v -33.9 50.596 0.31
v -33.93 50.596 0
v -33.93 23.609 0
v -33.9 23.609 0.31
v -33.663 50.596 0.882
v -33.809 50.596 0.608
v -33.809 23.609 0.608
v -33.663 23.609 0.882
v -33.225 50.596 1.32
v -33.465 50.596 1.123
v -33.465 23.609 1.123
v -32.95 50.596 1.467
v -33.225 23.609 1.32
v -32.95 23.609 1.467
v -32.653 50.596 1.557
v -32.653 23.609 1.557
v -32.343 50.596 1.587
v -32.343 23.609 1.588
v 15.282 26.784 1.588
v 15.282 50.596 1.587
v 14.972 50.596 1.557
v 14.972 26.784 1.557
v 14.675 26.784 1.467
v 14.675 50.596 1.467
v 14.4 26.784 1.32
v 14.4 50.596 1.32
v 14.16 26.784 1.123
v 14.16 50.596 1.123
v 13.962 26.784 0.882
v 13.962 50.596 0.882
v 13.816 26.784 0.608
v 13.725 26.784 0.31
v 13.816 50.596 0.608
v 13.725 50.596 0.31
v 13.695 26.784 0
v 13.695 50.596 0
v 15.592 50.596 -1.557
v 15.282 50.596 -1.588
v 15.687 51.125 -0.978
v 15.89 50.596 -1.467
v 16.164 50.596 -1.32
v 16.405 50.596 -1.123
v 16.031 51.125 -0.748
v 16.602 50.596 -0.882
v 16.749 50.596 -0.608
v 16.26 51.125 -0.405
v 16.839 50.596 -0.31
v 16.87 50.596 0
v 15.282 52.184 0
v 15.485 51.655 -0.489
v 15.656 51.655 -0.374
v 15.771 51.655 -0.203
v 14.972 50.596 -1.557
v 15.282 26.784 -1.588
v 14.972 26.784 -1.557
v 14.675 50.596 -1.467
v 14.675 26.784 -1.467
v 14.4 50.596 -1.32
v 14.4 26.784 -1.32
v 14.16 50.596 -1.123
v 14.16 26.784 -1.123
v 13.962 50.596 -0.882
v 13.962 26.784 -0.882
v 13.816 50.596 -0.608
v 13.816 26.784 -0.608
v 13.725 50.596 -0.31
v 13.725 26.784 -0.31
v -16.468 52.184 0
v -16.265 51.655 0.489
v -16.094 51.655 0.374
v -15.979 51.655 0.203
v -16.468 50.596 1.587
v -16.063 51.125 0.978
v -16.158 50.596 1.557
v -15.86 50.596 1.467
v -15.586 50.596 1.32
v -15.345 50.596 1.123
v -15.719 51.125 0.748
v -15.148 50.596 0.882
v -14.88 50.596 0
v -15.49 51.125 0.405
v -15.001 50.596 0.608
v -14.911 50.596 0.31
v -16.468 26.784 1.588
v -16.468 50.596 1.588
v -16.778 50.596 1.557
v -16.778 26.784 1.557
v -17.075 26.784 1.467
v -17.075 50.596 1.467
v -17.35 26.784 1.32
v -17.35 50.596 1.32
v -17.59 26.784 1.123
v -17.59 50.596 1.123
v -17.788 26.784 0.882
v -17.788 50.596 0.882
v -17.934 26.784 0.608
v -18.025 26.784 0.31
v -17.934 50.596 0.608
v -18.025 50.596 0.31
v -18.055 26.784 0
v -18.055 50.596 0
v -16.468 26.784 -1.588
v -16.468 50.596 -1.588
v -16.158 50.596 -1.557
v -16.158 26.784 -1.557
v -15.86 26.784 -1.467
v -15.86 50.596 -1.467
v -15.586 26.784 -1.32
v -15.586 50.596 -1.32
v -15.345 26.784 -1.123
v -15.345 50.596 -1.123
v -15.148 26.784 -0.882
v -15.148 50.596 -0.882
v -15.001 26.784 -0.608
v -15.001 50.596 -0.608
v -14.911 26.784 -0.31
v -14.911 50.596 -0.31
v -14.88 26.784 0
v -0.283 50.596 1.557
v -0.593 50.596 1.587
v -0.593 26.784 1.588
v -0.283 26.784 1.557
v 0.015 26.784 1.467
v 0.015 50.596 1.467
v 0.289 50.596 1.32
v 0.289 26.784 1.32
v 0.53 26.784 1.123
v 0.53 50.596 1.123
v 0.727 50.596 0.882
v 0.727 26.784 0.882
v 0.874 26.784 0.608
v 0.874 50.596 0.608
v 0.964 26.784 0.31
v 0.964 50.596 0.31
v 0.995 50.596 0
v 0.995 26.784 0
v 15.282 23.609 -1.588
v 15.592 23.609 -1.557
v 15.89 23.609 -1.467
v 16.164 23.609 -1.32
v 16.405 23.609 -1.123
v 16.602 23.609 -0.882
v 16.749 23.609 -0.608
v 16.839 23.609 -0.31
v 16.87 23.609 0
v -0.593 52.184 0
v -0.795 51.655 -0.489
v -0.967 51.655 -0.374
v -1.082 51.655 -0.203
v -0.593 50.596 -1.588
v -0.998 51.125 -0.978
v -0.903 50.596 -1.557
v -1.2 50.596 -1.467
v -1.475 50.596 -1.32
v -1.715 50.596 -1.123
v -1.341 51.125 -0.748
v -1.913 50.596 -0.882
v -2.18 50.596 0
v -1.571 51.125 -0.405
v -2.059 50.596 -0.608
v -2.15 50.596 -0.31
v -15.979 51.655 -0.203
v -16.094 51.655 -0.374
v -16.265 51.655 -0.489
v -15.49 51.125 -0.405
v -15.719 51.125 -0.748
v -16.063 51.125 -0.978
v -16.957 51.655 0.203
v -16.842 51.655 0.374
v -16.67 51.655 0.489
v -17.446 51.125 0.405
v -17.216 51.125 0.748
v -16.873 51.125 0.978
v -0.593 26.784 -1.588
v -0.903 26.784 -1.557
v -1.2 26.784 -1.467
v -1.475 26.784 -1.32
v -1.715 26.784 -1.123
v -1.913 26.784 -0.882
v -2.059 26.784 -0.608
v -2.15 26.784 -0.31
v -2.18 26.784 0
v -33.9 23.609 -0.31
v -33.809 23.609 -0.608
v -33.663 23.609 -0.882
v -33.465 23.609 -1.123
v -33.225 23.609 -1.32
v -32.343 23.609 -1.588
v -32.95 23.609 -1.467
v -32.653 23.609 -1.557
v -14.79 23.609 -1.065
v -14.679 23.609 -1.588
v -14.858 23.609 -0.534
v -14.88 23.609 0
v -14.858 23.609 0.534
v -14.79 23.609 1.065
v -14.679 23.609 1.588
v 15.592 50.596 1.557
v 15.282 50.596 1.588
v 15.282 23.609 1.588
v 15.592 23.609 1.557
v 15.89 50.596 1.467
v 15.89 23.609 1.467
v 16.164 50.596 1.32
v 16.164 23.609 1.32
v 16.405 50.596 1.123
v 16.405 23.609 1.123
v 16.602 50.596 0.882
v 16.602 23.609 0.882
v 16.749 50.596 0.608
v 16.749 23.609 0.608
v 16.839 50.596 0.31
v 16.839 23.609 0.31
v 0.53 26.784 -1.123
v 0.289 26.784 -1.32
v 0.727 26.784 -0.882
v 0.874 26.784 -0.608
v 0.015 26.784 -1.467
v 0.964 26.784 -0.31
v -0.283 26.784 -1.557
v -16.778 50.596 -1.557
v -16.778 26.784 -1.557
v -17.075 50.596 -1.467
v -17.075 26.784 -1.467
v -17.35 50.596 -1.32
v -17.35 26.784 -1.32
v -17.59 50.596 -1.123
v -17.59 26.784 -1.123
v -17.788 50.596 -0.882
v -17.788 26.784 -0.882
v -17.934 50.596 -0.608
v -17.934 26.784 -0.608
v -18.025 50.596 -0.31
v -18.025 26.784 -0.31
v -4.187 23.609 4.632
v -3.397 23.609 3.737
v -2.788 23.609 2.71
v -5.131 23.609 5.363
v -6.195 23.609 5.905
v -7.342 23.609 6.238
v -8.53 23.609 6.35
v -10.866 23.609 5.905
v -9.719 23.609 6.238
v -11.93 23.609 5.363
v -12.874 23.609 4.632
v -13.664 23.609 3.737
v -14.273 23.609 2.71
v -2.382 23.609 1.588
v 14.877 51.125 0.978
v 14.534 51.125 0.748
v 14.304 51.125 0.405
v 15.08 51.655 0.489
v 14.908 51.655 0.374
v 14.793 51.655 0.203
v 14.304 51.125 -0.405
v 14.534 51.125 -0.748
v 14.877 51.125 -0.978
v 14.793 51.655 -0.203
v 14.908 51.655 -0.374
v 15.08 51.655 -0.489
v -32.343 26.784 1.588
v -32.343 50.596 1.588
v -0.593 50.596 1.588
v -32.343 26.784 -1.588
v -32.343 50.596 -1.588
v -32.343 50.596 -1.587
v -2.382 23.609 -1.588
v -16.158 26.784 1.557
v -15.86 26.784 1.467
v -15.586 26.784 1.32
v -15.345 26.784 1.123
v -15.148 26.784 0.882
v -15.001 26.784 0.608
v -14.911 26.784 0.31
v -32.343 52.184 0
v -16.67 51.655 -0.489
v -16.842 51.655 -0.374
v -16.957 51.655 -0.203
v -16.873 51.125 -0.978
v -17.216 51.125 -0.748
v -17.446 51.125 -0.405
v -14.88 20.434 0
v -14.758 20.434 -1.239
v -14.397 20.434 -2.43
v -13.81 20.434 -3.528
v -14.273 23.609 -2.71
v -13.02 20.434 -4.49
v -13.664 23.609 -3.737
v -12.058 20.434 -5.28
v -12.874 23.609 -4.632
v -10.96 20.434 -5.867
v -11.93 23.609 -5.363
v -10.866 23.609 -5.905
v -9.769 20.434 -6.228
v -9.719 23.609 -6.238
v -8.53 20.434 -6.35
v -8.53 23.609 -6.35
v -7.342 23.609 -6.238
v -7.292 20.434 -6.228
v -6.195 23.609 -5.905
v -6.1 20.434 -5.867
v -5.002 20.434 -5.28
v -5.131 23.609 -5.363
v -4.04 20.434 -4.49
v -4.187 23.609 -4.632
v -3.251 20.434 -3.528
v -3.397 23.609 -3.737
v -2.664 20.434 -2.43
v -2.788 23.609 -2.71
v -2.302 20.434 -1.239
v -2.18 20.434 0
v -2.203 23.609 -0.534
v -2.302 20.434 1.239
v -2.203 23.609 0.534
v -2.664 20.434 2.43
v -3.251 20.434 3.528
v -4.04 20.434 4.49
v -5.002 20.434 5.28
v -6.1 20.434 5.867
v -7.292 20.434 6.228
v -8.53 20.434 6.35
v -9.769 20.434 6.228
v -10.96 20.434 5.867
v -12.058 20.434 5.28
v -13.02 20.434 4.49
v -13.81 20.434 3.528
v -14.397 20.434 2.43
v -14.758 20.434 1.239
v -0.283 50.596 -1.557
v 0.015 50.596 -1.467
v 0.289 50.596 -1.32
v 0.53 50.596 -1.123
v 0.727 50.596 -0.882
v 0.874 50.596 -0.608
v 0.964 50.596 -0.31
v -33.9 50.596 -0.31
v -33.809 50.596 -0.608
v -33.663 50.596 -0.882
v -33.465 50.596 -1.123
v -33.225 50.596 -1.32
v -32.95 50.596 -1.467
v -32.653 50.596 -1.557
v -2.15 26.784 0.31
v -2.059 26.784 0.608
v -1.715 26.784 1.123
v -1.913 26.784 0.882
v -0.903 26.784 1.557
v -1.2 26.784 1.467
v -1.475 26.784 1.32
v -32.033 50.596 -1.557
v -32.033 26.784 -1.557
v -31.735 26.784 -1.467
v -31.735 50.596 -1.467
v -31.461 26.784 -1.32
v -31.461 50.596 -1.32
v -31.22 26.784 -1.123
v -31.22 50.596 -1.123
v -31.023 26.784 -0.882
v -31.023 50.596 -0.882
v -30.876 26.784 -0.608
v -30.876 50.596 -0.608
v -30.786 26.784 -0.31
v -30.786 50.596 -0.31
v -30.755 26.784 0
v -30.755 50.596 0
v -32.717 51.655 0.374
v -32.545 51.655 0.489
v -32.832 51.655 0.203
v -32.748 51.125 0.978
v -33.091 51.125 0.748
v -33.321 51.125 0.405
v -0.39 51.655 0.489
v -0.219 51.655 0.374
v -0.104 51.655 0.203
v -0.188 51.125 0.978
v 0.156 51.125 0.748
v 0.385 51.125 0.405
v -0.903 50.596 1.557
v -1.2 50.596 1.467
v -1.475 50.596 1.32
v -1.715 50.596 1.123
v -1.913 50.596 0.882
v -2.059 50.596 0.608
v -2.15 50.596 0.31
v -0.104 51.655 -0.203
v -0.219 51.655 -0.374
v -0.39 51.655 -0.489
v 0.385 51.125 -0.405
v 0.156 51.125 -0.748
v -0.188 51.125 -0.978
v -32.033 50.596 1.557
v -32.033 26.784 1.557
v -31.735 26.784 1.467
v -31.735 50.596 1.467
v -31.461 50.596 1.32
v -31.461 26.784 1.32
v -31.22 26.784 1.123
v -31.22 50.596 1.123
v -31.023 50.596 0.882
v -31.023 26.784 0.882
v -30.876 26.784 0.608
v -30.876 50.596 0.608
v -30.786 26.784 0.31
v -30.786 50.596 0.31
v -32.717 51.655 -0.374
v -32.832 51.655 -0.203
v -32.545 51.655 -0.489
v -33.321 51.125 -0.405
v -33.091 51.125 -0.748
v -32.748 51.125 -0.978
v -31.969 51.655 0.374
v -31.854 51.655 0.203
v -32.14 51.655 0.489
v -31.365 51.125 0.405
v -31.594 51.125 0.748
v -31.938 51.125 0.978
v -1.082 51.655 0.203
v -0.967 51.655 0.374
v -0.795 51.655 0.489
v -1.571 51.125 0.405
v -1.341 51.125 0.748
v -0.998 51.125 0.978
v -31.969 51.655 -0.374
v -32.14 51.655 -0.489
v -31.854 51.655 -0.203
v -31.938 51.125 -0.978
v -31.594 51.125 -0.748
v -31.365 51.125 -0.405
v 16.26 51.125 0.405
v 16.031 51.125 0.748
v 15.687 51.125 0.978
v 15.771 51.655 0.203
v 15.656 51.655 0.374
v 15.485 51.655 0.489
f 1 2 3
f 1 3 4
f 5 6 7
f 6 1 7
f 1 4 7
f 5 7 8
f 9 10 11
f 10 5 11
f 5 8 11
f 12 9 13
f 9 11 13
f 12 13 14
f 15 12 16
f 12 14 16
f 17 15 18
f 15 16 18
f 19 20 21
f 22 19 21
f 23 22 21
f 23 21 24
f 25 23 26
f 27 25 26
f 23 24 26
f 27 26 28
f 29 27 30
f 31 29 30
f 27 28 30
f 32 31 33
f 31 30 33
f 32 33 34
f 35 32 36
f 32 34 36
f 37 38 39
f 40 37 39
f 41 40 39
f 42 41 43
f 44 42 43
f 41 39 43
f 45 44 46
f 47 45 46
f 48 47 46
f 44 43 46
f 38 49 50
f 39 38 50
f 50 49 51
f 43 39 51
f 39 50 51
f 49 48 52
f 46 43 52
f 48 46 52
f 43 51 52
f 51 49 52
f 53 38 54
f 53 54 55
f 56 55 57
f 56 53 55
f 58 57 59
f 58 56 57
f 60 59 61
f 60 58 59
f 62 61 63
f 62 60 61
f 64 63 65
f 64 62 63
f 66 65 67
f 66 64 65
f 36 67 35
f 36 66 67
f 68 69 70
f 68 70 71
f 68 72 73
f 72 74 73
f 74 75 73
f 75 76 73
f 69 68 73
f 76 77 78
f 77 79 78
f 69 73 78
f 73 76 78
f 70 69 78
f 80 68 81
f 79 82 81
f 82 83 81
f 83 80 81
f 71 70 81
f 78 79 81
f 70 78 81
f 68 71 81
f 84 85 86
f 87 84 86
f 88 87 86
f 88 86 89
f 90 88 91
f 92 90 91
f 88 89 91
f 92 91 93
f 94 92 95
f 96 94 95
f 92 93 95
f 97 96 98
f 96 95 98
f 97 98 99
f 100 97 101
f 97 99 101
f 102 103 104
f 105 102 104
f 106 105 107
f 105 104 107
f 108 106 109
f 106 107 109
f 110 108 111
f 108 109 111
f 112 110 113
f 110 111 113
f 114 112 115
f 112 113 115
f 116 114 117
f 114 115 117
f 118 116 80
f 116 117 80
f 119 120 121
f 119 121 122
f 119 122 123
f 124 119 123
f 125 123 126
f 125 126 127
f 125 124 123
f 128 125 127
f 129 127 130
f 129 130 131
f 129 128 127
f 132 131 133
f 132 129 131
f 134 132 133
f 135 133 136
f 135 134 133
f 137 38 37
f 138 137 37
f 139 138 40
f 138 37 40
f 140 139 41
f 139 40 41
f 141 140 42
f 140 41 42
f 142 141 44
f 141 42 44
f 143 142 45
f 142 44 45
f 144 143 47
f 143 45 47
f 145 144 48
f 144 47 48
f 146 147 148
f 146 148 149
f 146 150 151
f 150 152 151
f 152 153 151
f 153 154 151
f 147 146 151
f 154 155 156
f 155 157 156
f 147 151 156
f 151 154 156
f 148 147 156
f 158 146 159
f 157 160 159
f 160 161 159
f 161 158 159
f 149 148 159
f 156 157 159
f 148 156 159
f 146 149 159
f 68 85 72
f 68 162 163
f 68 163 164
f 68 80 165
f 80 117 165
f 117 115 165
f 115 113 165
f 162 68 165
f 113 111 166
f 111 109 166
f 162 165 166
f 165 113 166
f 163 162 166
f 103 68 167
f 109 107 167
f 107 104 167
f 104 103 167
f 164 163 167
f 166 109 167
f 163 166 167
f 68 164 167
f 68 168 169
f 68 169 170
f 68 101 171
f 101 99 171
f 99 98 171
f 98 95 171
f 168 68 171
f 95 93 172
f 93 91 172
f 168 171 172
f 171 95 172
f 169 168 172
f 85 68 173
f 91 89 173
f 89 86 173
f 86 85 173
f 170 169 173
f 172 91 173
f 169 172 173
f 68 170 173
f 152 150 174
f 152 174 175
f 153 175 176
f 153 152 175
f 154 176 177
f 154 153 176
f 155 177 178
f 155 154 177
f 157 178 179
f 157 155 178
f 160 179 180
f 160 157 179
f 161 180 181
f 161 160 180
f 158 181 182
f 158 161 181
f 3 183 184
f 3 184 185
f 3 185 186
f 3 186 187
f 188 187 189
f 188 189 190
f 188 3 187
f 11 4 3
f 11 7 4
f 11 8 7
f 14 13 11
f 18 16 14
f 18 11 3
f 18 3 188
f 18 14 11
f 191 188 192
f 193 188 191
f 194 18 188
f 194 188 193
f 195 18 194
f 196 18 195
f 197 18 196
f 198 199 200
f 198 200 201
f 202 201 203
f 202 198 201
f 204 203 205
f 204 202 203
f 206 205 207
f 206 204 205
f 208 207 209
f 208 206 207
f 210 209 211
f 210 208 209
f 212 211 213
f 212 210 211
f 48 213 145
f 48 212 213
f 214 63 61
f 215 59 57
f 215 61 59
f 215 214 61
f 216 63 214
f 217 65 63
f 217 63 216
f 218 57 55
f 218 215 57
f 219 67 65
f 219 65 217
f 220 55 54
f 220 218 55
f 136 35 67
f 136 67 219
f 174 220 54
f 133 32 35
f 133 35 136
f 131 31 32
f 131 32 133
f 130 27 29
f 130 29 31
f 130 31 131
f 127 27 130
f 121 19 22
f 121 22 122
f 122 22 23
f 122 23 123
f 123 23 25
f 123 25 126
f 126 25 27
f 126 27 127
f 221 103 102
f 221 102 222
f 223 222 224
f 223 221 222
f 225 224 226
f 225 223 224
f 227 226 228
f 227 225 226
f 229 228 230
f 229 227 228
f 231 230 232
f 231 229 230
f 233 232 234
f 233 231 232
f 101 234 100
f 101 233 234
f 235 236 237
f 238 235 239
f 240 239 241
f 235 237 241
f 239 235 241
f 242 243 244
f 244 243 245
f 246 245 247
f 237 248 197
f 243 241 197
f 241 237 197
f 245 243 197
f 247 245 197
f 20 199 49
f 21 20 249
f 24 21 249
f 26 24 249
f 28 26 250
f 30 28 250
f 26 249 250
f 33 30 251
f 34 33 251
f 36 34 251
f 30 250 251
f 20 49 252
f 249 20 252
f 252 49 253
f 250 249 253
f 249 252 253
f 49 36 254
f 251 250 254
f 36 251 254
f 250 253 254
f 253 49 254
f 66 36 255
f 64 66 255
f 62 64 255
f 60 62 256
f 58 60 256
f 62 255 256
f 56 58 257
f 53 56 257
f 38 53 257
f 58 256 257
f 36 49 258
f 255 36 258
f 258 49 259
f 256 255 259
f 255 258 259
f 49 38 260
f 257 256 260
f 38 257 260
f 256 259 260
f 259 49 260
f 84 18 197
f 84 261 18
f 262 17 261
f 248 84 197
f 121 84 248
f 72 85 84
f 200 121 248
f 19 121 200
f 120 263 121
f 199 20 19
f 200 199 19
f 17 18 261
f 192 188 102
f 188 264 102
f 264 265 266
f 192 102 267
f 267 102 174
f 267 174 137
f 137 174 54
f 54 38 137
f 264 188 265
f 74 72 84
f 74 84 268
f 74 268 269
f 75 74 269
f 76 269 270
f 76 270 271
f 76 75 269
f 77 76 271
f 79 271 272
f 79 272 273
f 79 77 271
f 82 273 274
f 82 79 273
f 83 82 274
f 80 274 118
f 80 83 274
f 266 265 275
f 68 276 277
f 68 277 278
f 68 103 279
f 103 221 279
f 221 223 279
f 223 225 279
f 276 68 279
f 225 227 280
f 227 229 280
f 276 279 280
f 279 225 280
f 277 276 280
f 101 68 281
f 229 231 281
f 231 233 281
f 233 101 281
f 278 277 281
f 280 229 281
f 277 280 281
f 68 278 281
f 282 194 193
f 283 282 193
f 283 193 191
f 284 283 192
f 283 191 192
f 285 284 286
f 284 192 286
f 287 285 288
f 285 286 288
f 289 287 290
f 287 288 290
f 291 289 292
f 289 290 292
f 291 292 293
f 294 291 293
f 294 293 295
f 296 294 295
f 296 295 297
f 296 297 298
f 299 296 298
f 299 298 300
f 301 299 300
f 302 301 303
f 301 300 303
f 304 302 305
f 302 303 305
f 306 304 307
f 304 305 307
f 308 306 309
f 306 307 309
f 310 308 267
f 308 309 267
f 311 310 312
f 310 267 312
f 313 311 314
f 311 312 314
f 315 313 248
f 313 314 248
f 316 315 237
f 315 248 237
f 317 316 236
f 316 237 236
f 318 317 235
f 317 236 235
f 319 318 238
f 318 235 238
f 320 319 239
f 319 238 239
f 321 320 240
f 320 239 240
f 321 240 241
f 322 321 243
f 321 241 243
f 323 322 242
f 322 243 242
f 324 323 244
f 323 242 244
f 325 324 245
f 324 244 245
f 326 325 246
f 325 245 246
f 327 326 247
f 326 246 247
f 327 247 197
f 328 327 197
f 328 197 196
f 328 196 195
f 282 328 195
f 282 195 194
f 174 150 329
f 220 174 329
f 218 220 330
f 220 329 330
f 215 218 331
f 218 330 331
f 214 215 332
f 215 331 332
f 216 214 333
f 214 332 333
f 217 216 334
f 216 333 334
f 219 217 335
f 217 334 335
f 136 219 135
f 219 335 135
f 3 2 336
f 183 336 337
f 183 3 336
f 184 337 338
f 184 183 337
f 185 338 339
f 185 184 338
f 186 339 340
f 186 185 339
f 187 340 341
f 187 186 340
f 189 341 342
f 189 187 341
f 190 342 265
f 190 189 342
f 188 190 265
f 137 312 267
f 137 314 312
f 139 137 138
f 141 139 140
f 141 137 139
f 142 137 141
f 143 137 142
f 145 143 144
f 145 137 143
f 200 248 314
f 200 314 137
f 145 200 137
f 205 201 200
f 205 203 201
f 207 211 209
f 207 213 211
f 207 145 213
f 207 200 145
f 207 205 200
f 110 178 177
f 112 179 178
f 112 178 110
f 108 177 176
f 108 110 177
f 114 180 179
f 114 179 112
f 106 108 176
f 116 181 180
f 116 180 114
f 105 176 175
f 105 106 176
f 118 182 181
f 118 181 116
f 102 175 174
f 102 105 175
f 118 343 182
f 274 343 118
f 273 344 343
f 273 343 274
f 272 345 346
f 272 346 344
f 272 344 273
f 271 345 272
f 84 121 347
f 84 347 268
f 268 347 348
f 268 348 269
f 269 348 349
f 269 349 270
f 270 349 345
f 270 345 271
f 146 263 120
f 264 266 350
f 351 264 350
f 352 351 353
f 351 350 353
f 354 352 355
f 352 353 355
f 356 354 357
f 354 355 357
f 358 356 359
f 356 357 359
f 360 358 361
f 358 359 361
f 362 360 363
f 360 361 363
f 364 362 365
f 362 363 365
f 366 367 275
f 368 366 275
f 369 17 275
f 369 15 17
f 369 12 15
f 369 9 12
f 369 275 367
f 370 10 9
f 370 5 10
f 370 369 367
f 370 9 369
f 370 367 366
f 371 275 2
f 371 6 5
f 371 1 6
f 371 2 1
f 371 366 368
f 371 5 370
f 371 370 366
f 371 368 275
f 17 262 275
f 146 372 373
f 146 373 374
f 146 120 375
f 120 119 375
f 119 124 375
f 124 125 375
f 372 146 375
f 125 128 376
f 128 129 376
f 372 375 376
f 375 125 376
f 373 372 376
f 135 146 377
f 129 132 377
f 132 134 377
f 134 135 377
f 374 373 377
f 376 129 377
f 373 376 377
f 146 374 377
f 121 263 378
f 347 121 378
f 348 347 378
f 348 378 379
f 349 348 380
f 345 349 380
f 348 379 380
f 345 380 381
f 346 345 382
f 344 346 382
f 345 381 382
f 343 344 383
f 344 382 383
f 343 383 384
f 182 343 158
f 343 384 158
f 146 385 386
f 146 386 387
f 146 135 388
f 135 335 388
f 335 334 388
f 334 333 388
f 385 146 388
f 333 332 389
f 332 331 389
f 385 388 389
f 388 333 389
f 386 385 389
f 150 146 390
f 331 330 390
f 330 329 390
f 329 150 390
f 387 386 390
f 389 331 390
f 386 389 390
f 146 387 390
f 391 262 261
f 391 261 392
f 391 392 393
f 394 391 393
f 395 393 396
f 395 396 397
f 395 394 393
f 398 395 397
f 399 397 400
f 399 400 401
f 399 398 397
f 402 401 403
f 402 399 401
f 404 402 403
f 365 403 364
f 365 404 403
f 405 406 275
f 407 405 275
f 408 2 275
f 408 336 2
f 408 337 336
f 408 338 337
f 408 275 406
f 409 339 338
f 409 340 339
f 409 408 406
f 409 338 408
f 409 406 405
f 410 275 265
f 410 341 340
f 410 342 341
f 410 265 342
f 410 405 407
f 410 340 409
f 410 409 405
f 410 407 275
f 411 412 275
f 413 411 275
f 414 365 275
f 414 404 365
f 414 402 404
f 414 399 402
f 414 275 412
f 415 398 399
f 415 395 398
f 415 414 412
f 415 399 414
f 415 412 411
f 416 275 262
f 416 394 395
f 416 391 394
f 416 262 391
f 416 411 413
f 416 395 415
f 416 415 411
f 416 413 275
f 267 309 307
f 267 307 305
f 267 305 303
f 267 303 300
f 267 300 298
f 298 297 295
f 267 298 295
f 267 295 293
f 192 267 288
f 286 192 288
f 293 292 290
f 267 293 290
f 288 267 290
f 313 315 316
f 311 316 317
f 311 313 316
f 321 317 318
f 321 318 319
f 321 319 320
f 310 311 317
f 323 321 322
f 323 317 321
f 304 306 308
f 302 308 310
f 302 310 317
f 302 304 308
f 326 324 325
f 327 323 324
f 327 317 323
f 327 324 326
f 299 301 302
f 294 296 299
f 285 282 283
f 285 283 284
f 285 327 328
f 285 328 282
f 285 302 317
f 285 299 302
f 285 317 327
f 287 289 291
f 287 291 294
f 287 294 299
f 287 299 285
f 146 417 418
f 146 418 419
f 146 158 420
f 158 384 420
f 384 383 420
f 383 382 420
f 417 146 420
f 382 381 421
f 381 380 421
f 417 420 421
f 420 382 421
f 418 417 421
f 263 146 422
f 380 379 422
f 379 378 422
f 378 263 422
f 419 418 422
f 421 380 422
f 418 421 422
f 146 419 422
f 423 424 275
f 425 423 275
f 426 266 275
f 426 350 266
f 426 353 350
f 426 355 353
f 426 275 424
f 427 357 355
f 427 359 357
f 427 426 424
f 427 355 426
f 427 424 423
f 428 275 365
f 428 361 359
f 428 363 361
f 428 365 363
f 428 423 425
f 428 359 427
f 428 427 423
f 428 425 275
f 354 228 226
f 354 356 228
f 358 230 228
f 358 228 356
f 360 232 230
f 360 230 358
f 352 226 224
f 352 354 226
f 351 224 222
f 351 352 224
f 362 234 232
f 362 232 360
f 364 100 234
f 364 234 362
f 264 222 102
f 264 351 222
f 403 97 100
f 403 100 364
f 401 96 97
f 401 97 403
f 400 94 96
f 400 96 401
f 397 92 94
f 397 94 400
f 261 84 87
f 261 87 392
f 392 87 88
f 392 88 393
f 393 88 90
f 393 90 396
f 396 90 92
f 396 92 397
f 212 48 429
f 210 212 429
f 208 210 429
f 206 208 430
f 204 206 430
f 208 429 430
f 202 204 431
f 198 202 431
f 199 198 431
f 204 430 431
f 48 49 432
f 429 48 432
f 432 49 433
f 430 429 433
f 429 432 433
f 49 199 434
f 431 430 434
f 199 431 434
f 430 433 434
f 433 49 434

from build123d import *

# Parameters (mm, degrees)
F0_W     = 6.35
F0_H     = 3.175
F0_W_2   = 3.175
F0_H_2   = 25.4
F2_DEPTH = 1.5875
F3_R     = 1.58749
F4_SIZE  = 1.58749


# Not quite as in the source:
# - a fillet or chamfer is up to 0.001 mm smaller than in the source, because OpenCascade refuses the exact size


with BuildPart() as f1:
    # F0 (on Top) → F1 (revolve)
    with BuildSketch(Plane.XY):
        with Locations((-11.7053389192, 22.0213071685)):
            Rectangle(F0_W, F0_H)
    revolve(axis=Axis((-8.5303389192, 22.0213071685, 0), (0, -1, 0)))

    # F0 (on Top) → F2 (join, symmetric)
    with BuildSketch(Plane.XY):
        Polygon((-33.9303389192, 23.6088071685), (-14.8803389192, 23.6088071685), (-8.5303389192, 23.6088071685), (-2.1803389192, 23.6088071685), (16.8696610808, 23.6088071685), (16.8696610808, 26.7838071685), (13.6946610808, 26.7838071685), (0.9946610808, 26.7838071685), (-2.1803389192, 26.7838071685), (-8.5303389192, 26.7838071685), (-14.8803389192, 26.7838071685), (-18.0553389192, 26.7838071685), (-30.7553389192, 26.7838071685), (-33.9303389192, 26.7838071685), align=None)
        with Locations((-32.3428389192, 39.4838071685)):
            Rectangle(F0_W_2, F0_H_2)
        with Locations((-16.4678389192, 39.4838071685)):
            Rectangle(F0_W_2, F0_H_2)
        with Locations((-0.5928389192, 39.4838071685)):
            Rectangle(F0_W_2, F0_H_2)
        with Locations((15.2821610808, 39.4838071685)):
            Rectangle(F0_W_2, F0_H_2)
    extrude(amount=F2_DEPTH, both=True)

    # F3 (radius 1.5875 in the source; OpenCascade refuses exactly that, so slightly less here)
    f3_edges = [f1.edges().sort_by_distance(p)[0] for p in [
        (-33.930339, 37.896307, 1.5875),
        (-33.930339, 37.896307, -1.5875),
        (-30.755339, 39.483807, 1.5875),
        (-30.755339, 39.483807, -1.5875),
        (-18.055339, 39.483807, 1.5875),
        (-18.055339, 39.483807, -1.5875),
        (-14.880339, 39.483807, 1.5875),
        (-14.880339, 39.483807, -1.5875),
        (-2.180339, 39.483807, 1.5875),
        (-2.180339, 39.483807, -1.5875),
        (0.994661, 39.483807, -1.5875),
        (0.994661, 39.483807, 1.5875),
        (16.869661, 37.896307, -1.5875),
        (16.869661, 37.896307, 1.5875),
        (13.694661, 39.483807, 1.5875),
        (13.694661, 39.483807, -1.5875),
    ]]
    fillet(f3_edges, radius=F3_R)

    # F4 (size 1.5875 in the source; OpenCascade refuses exactly that, so slightly less here)
    f4_edges = [f1.edges().sort_by_distance(p)[0] for p in [
        (-33.465374, 52.183807, -1.122535),
        (-17.590374, 52.183807, -1.122535),
        (-1.715374, 52.183807, -1.122535),
        (16.404696, 52.183807, -1.122535),
    ]]
    chamfer(f4_edges, length=F4_SIZE)


solid = f1.part
